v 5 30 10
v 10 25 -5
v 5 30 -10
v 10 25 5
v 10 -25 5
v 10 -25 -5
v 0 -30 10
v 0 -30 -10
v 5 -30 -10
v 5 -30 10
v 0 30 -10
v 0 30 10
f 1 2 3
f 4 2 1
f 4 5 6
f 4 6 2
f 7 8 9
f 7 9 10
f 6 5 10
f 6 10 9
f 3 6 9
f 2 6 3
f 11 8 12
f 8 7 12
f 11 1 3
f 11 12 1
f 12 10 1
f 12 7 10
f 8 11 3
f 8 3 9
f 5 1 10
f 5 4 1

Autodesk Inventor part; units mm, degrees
ref_plane "YZ Plane" through (0, 0, 0) normal (1, 0, 0) x (0, 1, 0)
ref_plane "XZ Plane" through (0, 0, 0) normal (0, 1, 0) x (-1, 0, 0)
ref_plane "XY Plane" through (0, 0, 0) normal (0, 0, 1) x (1, 0, 0)
sketch "スケッチ2" plane through (0, 0, 0) normal (1, 0, 0) x (0, 1, 0)
  line L0 (-30, 10) -> (30, 10)
  line L1 (30, 10) -> (30, -10)
  line L2 (30, -10) -> (-30, -10)
  line L3 (-30, -10) -> (-30, 10)
  line L4 (-30, 10) -> (30, -10) construction
  line L5 (30, 10) -> (-30, -10) construction
  point P0 (0, 0)
  dimension "d4" = 60
  dimension "d5" = 20
extrude "押し出し2" add sketch "スケッチ2" along normal blind 10
chamfer "面取り1" distance 5 angle 45 4 edges at (10, 0, -10) (10, 30, 0) (10, 0, 10) (10, -30, 0)
properties part number "Print_Parts_U" material "PC/ABS プラスチック"
